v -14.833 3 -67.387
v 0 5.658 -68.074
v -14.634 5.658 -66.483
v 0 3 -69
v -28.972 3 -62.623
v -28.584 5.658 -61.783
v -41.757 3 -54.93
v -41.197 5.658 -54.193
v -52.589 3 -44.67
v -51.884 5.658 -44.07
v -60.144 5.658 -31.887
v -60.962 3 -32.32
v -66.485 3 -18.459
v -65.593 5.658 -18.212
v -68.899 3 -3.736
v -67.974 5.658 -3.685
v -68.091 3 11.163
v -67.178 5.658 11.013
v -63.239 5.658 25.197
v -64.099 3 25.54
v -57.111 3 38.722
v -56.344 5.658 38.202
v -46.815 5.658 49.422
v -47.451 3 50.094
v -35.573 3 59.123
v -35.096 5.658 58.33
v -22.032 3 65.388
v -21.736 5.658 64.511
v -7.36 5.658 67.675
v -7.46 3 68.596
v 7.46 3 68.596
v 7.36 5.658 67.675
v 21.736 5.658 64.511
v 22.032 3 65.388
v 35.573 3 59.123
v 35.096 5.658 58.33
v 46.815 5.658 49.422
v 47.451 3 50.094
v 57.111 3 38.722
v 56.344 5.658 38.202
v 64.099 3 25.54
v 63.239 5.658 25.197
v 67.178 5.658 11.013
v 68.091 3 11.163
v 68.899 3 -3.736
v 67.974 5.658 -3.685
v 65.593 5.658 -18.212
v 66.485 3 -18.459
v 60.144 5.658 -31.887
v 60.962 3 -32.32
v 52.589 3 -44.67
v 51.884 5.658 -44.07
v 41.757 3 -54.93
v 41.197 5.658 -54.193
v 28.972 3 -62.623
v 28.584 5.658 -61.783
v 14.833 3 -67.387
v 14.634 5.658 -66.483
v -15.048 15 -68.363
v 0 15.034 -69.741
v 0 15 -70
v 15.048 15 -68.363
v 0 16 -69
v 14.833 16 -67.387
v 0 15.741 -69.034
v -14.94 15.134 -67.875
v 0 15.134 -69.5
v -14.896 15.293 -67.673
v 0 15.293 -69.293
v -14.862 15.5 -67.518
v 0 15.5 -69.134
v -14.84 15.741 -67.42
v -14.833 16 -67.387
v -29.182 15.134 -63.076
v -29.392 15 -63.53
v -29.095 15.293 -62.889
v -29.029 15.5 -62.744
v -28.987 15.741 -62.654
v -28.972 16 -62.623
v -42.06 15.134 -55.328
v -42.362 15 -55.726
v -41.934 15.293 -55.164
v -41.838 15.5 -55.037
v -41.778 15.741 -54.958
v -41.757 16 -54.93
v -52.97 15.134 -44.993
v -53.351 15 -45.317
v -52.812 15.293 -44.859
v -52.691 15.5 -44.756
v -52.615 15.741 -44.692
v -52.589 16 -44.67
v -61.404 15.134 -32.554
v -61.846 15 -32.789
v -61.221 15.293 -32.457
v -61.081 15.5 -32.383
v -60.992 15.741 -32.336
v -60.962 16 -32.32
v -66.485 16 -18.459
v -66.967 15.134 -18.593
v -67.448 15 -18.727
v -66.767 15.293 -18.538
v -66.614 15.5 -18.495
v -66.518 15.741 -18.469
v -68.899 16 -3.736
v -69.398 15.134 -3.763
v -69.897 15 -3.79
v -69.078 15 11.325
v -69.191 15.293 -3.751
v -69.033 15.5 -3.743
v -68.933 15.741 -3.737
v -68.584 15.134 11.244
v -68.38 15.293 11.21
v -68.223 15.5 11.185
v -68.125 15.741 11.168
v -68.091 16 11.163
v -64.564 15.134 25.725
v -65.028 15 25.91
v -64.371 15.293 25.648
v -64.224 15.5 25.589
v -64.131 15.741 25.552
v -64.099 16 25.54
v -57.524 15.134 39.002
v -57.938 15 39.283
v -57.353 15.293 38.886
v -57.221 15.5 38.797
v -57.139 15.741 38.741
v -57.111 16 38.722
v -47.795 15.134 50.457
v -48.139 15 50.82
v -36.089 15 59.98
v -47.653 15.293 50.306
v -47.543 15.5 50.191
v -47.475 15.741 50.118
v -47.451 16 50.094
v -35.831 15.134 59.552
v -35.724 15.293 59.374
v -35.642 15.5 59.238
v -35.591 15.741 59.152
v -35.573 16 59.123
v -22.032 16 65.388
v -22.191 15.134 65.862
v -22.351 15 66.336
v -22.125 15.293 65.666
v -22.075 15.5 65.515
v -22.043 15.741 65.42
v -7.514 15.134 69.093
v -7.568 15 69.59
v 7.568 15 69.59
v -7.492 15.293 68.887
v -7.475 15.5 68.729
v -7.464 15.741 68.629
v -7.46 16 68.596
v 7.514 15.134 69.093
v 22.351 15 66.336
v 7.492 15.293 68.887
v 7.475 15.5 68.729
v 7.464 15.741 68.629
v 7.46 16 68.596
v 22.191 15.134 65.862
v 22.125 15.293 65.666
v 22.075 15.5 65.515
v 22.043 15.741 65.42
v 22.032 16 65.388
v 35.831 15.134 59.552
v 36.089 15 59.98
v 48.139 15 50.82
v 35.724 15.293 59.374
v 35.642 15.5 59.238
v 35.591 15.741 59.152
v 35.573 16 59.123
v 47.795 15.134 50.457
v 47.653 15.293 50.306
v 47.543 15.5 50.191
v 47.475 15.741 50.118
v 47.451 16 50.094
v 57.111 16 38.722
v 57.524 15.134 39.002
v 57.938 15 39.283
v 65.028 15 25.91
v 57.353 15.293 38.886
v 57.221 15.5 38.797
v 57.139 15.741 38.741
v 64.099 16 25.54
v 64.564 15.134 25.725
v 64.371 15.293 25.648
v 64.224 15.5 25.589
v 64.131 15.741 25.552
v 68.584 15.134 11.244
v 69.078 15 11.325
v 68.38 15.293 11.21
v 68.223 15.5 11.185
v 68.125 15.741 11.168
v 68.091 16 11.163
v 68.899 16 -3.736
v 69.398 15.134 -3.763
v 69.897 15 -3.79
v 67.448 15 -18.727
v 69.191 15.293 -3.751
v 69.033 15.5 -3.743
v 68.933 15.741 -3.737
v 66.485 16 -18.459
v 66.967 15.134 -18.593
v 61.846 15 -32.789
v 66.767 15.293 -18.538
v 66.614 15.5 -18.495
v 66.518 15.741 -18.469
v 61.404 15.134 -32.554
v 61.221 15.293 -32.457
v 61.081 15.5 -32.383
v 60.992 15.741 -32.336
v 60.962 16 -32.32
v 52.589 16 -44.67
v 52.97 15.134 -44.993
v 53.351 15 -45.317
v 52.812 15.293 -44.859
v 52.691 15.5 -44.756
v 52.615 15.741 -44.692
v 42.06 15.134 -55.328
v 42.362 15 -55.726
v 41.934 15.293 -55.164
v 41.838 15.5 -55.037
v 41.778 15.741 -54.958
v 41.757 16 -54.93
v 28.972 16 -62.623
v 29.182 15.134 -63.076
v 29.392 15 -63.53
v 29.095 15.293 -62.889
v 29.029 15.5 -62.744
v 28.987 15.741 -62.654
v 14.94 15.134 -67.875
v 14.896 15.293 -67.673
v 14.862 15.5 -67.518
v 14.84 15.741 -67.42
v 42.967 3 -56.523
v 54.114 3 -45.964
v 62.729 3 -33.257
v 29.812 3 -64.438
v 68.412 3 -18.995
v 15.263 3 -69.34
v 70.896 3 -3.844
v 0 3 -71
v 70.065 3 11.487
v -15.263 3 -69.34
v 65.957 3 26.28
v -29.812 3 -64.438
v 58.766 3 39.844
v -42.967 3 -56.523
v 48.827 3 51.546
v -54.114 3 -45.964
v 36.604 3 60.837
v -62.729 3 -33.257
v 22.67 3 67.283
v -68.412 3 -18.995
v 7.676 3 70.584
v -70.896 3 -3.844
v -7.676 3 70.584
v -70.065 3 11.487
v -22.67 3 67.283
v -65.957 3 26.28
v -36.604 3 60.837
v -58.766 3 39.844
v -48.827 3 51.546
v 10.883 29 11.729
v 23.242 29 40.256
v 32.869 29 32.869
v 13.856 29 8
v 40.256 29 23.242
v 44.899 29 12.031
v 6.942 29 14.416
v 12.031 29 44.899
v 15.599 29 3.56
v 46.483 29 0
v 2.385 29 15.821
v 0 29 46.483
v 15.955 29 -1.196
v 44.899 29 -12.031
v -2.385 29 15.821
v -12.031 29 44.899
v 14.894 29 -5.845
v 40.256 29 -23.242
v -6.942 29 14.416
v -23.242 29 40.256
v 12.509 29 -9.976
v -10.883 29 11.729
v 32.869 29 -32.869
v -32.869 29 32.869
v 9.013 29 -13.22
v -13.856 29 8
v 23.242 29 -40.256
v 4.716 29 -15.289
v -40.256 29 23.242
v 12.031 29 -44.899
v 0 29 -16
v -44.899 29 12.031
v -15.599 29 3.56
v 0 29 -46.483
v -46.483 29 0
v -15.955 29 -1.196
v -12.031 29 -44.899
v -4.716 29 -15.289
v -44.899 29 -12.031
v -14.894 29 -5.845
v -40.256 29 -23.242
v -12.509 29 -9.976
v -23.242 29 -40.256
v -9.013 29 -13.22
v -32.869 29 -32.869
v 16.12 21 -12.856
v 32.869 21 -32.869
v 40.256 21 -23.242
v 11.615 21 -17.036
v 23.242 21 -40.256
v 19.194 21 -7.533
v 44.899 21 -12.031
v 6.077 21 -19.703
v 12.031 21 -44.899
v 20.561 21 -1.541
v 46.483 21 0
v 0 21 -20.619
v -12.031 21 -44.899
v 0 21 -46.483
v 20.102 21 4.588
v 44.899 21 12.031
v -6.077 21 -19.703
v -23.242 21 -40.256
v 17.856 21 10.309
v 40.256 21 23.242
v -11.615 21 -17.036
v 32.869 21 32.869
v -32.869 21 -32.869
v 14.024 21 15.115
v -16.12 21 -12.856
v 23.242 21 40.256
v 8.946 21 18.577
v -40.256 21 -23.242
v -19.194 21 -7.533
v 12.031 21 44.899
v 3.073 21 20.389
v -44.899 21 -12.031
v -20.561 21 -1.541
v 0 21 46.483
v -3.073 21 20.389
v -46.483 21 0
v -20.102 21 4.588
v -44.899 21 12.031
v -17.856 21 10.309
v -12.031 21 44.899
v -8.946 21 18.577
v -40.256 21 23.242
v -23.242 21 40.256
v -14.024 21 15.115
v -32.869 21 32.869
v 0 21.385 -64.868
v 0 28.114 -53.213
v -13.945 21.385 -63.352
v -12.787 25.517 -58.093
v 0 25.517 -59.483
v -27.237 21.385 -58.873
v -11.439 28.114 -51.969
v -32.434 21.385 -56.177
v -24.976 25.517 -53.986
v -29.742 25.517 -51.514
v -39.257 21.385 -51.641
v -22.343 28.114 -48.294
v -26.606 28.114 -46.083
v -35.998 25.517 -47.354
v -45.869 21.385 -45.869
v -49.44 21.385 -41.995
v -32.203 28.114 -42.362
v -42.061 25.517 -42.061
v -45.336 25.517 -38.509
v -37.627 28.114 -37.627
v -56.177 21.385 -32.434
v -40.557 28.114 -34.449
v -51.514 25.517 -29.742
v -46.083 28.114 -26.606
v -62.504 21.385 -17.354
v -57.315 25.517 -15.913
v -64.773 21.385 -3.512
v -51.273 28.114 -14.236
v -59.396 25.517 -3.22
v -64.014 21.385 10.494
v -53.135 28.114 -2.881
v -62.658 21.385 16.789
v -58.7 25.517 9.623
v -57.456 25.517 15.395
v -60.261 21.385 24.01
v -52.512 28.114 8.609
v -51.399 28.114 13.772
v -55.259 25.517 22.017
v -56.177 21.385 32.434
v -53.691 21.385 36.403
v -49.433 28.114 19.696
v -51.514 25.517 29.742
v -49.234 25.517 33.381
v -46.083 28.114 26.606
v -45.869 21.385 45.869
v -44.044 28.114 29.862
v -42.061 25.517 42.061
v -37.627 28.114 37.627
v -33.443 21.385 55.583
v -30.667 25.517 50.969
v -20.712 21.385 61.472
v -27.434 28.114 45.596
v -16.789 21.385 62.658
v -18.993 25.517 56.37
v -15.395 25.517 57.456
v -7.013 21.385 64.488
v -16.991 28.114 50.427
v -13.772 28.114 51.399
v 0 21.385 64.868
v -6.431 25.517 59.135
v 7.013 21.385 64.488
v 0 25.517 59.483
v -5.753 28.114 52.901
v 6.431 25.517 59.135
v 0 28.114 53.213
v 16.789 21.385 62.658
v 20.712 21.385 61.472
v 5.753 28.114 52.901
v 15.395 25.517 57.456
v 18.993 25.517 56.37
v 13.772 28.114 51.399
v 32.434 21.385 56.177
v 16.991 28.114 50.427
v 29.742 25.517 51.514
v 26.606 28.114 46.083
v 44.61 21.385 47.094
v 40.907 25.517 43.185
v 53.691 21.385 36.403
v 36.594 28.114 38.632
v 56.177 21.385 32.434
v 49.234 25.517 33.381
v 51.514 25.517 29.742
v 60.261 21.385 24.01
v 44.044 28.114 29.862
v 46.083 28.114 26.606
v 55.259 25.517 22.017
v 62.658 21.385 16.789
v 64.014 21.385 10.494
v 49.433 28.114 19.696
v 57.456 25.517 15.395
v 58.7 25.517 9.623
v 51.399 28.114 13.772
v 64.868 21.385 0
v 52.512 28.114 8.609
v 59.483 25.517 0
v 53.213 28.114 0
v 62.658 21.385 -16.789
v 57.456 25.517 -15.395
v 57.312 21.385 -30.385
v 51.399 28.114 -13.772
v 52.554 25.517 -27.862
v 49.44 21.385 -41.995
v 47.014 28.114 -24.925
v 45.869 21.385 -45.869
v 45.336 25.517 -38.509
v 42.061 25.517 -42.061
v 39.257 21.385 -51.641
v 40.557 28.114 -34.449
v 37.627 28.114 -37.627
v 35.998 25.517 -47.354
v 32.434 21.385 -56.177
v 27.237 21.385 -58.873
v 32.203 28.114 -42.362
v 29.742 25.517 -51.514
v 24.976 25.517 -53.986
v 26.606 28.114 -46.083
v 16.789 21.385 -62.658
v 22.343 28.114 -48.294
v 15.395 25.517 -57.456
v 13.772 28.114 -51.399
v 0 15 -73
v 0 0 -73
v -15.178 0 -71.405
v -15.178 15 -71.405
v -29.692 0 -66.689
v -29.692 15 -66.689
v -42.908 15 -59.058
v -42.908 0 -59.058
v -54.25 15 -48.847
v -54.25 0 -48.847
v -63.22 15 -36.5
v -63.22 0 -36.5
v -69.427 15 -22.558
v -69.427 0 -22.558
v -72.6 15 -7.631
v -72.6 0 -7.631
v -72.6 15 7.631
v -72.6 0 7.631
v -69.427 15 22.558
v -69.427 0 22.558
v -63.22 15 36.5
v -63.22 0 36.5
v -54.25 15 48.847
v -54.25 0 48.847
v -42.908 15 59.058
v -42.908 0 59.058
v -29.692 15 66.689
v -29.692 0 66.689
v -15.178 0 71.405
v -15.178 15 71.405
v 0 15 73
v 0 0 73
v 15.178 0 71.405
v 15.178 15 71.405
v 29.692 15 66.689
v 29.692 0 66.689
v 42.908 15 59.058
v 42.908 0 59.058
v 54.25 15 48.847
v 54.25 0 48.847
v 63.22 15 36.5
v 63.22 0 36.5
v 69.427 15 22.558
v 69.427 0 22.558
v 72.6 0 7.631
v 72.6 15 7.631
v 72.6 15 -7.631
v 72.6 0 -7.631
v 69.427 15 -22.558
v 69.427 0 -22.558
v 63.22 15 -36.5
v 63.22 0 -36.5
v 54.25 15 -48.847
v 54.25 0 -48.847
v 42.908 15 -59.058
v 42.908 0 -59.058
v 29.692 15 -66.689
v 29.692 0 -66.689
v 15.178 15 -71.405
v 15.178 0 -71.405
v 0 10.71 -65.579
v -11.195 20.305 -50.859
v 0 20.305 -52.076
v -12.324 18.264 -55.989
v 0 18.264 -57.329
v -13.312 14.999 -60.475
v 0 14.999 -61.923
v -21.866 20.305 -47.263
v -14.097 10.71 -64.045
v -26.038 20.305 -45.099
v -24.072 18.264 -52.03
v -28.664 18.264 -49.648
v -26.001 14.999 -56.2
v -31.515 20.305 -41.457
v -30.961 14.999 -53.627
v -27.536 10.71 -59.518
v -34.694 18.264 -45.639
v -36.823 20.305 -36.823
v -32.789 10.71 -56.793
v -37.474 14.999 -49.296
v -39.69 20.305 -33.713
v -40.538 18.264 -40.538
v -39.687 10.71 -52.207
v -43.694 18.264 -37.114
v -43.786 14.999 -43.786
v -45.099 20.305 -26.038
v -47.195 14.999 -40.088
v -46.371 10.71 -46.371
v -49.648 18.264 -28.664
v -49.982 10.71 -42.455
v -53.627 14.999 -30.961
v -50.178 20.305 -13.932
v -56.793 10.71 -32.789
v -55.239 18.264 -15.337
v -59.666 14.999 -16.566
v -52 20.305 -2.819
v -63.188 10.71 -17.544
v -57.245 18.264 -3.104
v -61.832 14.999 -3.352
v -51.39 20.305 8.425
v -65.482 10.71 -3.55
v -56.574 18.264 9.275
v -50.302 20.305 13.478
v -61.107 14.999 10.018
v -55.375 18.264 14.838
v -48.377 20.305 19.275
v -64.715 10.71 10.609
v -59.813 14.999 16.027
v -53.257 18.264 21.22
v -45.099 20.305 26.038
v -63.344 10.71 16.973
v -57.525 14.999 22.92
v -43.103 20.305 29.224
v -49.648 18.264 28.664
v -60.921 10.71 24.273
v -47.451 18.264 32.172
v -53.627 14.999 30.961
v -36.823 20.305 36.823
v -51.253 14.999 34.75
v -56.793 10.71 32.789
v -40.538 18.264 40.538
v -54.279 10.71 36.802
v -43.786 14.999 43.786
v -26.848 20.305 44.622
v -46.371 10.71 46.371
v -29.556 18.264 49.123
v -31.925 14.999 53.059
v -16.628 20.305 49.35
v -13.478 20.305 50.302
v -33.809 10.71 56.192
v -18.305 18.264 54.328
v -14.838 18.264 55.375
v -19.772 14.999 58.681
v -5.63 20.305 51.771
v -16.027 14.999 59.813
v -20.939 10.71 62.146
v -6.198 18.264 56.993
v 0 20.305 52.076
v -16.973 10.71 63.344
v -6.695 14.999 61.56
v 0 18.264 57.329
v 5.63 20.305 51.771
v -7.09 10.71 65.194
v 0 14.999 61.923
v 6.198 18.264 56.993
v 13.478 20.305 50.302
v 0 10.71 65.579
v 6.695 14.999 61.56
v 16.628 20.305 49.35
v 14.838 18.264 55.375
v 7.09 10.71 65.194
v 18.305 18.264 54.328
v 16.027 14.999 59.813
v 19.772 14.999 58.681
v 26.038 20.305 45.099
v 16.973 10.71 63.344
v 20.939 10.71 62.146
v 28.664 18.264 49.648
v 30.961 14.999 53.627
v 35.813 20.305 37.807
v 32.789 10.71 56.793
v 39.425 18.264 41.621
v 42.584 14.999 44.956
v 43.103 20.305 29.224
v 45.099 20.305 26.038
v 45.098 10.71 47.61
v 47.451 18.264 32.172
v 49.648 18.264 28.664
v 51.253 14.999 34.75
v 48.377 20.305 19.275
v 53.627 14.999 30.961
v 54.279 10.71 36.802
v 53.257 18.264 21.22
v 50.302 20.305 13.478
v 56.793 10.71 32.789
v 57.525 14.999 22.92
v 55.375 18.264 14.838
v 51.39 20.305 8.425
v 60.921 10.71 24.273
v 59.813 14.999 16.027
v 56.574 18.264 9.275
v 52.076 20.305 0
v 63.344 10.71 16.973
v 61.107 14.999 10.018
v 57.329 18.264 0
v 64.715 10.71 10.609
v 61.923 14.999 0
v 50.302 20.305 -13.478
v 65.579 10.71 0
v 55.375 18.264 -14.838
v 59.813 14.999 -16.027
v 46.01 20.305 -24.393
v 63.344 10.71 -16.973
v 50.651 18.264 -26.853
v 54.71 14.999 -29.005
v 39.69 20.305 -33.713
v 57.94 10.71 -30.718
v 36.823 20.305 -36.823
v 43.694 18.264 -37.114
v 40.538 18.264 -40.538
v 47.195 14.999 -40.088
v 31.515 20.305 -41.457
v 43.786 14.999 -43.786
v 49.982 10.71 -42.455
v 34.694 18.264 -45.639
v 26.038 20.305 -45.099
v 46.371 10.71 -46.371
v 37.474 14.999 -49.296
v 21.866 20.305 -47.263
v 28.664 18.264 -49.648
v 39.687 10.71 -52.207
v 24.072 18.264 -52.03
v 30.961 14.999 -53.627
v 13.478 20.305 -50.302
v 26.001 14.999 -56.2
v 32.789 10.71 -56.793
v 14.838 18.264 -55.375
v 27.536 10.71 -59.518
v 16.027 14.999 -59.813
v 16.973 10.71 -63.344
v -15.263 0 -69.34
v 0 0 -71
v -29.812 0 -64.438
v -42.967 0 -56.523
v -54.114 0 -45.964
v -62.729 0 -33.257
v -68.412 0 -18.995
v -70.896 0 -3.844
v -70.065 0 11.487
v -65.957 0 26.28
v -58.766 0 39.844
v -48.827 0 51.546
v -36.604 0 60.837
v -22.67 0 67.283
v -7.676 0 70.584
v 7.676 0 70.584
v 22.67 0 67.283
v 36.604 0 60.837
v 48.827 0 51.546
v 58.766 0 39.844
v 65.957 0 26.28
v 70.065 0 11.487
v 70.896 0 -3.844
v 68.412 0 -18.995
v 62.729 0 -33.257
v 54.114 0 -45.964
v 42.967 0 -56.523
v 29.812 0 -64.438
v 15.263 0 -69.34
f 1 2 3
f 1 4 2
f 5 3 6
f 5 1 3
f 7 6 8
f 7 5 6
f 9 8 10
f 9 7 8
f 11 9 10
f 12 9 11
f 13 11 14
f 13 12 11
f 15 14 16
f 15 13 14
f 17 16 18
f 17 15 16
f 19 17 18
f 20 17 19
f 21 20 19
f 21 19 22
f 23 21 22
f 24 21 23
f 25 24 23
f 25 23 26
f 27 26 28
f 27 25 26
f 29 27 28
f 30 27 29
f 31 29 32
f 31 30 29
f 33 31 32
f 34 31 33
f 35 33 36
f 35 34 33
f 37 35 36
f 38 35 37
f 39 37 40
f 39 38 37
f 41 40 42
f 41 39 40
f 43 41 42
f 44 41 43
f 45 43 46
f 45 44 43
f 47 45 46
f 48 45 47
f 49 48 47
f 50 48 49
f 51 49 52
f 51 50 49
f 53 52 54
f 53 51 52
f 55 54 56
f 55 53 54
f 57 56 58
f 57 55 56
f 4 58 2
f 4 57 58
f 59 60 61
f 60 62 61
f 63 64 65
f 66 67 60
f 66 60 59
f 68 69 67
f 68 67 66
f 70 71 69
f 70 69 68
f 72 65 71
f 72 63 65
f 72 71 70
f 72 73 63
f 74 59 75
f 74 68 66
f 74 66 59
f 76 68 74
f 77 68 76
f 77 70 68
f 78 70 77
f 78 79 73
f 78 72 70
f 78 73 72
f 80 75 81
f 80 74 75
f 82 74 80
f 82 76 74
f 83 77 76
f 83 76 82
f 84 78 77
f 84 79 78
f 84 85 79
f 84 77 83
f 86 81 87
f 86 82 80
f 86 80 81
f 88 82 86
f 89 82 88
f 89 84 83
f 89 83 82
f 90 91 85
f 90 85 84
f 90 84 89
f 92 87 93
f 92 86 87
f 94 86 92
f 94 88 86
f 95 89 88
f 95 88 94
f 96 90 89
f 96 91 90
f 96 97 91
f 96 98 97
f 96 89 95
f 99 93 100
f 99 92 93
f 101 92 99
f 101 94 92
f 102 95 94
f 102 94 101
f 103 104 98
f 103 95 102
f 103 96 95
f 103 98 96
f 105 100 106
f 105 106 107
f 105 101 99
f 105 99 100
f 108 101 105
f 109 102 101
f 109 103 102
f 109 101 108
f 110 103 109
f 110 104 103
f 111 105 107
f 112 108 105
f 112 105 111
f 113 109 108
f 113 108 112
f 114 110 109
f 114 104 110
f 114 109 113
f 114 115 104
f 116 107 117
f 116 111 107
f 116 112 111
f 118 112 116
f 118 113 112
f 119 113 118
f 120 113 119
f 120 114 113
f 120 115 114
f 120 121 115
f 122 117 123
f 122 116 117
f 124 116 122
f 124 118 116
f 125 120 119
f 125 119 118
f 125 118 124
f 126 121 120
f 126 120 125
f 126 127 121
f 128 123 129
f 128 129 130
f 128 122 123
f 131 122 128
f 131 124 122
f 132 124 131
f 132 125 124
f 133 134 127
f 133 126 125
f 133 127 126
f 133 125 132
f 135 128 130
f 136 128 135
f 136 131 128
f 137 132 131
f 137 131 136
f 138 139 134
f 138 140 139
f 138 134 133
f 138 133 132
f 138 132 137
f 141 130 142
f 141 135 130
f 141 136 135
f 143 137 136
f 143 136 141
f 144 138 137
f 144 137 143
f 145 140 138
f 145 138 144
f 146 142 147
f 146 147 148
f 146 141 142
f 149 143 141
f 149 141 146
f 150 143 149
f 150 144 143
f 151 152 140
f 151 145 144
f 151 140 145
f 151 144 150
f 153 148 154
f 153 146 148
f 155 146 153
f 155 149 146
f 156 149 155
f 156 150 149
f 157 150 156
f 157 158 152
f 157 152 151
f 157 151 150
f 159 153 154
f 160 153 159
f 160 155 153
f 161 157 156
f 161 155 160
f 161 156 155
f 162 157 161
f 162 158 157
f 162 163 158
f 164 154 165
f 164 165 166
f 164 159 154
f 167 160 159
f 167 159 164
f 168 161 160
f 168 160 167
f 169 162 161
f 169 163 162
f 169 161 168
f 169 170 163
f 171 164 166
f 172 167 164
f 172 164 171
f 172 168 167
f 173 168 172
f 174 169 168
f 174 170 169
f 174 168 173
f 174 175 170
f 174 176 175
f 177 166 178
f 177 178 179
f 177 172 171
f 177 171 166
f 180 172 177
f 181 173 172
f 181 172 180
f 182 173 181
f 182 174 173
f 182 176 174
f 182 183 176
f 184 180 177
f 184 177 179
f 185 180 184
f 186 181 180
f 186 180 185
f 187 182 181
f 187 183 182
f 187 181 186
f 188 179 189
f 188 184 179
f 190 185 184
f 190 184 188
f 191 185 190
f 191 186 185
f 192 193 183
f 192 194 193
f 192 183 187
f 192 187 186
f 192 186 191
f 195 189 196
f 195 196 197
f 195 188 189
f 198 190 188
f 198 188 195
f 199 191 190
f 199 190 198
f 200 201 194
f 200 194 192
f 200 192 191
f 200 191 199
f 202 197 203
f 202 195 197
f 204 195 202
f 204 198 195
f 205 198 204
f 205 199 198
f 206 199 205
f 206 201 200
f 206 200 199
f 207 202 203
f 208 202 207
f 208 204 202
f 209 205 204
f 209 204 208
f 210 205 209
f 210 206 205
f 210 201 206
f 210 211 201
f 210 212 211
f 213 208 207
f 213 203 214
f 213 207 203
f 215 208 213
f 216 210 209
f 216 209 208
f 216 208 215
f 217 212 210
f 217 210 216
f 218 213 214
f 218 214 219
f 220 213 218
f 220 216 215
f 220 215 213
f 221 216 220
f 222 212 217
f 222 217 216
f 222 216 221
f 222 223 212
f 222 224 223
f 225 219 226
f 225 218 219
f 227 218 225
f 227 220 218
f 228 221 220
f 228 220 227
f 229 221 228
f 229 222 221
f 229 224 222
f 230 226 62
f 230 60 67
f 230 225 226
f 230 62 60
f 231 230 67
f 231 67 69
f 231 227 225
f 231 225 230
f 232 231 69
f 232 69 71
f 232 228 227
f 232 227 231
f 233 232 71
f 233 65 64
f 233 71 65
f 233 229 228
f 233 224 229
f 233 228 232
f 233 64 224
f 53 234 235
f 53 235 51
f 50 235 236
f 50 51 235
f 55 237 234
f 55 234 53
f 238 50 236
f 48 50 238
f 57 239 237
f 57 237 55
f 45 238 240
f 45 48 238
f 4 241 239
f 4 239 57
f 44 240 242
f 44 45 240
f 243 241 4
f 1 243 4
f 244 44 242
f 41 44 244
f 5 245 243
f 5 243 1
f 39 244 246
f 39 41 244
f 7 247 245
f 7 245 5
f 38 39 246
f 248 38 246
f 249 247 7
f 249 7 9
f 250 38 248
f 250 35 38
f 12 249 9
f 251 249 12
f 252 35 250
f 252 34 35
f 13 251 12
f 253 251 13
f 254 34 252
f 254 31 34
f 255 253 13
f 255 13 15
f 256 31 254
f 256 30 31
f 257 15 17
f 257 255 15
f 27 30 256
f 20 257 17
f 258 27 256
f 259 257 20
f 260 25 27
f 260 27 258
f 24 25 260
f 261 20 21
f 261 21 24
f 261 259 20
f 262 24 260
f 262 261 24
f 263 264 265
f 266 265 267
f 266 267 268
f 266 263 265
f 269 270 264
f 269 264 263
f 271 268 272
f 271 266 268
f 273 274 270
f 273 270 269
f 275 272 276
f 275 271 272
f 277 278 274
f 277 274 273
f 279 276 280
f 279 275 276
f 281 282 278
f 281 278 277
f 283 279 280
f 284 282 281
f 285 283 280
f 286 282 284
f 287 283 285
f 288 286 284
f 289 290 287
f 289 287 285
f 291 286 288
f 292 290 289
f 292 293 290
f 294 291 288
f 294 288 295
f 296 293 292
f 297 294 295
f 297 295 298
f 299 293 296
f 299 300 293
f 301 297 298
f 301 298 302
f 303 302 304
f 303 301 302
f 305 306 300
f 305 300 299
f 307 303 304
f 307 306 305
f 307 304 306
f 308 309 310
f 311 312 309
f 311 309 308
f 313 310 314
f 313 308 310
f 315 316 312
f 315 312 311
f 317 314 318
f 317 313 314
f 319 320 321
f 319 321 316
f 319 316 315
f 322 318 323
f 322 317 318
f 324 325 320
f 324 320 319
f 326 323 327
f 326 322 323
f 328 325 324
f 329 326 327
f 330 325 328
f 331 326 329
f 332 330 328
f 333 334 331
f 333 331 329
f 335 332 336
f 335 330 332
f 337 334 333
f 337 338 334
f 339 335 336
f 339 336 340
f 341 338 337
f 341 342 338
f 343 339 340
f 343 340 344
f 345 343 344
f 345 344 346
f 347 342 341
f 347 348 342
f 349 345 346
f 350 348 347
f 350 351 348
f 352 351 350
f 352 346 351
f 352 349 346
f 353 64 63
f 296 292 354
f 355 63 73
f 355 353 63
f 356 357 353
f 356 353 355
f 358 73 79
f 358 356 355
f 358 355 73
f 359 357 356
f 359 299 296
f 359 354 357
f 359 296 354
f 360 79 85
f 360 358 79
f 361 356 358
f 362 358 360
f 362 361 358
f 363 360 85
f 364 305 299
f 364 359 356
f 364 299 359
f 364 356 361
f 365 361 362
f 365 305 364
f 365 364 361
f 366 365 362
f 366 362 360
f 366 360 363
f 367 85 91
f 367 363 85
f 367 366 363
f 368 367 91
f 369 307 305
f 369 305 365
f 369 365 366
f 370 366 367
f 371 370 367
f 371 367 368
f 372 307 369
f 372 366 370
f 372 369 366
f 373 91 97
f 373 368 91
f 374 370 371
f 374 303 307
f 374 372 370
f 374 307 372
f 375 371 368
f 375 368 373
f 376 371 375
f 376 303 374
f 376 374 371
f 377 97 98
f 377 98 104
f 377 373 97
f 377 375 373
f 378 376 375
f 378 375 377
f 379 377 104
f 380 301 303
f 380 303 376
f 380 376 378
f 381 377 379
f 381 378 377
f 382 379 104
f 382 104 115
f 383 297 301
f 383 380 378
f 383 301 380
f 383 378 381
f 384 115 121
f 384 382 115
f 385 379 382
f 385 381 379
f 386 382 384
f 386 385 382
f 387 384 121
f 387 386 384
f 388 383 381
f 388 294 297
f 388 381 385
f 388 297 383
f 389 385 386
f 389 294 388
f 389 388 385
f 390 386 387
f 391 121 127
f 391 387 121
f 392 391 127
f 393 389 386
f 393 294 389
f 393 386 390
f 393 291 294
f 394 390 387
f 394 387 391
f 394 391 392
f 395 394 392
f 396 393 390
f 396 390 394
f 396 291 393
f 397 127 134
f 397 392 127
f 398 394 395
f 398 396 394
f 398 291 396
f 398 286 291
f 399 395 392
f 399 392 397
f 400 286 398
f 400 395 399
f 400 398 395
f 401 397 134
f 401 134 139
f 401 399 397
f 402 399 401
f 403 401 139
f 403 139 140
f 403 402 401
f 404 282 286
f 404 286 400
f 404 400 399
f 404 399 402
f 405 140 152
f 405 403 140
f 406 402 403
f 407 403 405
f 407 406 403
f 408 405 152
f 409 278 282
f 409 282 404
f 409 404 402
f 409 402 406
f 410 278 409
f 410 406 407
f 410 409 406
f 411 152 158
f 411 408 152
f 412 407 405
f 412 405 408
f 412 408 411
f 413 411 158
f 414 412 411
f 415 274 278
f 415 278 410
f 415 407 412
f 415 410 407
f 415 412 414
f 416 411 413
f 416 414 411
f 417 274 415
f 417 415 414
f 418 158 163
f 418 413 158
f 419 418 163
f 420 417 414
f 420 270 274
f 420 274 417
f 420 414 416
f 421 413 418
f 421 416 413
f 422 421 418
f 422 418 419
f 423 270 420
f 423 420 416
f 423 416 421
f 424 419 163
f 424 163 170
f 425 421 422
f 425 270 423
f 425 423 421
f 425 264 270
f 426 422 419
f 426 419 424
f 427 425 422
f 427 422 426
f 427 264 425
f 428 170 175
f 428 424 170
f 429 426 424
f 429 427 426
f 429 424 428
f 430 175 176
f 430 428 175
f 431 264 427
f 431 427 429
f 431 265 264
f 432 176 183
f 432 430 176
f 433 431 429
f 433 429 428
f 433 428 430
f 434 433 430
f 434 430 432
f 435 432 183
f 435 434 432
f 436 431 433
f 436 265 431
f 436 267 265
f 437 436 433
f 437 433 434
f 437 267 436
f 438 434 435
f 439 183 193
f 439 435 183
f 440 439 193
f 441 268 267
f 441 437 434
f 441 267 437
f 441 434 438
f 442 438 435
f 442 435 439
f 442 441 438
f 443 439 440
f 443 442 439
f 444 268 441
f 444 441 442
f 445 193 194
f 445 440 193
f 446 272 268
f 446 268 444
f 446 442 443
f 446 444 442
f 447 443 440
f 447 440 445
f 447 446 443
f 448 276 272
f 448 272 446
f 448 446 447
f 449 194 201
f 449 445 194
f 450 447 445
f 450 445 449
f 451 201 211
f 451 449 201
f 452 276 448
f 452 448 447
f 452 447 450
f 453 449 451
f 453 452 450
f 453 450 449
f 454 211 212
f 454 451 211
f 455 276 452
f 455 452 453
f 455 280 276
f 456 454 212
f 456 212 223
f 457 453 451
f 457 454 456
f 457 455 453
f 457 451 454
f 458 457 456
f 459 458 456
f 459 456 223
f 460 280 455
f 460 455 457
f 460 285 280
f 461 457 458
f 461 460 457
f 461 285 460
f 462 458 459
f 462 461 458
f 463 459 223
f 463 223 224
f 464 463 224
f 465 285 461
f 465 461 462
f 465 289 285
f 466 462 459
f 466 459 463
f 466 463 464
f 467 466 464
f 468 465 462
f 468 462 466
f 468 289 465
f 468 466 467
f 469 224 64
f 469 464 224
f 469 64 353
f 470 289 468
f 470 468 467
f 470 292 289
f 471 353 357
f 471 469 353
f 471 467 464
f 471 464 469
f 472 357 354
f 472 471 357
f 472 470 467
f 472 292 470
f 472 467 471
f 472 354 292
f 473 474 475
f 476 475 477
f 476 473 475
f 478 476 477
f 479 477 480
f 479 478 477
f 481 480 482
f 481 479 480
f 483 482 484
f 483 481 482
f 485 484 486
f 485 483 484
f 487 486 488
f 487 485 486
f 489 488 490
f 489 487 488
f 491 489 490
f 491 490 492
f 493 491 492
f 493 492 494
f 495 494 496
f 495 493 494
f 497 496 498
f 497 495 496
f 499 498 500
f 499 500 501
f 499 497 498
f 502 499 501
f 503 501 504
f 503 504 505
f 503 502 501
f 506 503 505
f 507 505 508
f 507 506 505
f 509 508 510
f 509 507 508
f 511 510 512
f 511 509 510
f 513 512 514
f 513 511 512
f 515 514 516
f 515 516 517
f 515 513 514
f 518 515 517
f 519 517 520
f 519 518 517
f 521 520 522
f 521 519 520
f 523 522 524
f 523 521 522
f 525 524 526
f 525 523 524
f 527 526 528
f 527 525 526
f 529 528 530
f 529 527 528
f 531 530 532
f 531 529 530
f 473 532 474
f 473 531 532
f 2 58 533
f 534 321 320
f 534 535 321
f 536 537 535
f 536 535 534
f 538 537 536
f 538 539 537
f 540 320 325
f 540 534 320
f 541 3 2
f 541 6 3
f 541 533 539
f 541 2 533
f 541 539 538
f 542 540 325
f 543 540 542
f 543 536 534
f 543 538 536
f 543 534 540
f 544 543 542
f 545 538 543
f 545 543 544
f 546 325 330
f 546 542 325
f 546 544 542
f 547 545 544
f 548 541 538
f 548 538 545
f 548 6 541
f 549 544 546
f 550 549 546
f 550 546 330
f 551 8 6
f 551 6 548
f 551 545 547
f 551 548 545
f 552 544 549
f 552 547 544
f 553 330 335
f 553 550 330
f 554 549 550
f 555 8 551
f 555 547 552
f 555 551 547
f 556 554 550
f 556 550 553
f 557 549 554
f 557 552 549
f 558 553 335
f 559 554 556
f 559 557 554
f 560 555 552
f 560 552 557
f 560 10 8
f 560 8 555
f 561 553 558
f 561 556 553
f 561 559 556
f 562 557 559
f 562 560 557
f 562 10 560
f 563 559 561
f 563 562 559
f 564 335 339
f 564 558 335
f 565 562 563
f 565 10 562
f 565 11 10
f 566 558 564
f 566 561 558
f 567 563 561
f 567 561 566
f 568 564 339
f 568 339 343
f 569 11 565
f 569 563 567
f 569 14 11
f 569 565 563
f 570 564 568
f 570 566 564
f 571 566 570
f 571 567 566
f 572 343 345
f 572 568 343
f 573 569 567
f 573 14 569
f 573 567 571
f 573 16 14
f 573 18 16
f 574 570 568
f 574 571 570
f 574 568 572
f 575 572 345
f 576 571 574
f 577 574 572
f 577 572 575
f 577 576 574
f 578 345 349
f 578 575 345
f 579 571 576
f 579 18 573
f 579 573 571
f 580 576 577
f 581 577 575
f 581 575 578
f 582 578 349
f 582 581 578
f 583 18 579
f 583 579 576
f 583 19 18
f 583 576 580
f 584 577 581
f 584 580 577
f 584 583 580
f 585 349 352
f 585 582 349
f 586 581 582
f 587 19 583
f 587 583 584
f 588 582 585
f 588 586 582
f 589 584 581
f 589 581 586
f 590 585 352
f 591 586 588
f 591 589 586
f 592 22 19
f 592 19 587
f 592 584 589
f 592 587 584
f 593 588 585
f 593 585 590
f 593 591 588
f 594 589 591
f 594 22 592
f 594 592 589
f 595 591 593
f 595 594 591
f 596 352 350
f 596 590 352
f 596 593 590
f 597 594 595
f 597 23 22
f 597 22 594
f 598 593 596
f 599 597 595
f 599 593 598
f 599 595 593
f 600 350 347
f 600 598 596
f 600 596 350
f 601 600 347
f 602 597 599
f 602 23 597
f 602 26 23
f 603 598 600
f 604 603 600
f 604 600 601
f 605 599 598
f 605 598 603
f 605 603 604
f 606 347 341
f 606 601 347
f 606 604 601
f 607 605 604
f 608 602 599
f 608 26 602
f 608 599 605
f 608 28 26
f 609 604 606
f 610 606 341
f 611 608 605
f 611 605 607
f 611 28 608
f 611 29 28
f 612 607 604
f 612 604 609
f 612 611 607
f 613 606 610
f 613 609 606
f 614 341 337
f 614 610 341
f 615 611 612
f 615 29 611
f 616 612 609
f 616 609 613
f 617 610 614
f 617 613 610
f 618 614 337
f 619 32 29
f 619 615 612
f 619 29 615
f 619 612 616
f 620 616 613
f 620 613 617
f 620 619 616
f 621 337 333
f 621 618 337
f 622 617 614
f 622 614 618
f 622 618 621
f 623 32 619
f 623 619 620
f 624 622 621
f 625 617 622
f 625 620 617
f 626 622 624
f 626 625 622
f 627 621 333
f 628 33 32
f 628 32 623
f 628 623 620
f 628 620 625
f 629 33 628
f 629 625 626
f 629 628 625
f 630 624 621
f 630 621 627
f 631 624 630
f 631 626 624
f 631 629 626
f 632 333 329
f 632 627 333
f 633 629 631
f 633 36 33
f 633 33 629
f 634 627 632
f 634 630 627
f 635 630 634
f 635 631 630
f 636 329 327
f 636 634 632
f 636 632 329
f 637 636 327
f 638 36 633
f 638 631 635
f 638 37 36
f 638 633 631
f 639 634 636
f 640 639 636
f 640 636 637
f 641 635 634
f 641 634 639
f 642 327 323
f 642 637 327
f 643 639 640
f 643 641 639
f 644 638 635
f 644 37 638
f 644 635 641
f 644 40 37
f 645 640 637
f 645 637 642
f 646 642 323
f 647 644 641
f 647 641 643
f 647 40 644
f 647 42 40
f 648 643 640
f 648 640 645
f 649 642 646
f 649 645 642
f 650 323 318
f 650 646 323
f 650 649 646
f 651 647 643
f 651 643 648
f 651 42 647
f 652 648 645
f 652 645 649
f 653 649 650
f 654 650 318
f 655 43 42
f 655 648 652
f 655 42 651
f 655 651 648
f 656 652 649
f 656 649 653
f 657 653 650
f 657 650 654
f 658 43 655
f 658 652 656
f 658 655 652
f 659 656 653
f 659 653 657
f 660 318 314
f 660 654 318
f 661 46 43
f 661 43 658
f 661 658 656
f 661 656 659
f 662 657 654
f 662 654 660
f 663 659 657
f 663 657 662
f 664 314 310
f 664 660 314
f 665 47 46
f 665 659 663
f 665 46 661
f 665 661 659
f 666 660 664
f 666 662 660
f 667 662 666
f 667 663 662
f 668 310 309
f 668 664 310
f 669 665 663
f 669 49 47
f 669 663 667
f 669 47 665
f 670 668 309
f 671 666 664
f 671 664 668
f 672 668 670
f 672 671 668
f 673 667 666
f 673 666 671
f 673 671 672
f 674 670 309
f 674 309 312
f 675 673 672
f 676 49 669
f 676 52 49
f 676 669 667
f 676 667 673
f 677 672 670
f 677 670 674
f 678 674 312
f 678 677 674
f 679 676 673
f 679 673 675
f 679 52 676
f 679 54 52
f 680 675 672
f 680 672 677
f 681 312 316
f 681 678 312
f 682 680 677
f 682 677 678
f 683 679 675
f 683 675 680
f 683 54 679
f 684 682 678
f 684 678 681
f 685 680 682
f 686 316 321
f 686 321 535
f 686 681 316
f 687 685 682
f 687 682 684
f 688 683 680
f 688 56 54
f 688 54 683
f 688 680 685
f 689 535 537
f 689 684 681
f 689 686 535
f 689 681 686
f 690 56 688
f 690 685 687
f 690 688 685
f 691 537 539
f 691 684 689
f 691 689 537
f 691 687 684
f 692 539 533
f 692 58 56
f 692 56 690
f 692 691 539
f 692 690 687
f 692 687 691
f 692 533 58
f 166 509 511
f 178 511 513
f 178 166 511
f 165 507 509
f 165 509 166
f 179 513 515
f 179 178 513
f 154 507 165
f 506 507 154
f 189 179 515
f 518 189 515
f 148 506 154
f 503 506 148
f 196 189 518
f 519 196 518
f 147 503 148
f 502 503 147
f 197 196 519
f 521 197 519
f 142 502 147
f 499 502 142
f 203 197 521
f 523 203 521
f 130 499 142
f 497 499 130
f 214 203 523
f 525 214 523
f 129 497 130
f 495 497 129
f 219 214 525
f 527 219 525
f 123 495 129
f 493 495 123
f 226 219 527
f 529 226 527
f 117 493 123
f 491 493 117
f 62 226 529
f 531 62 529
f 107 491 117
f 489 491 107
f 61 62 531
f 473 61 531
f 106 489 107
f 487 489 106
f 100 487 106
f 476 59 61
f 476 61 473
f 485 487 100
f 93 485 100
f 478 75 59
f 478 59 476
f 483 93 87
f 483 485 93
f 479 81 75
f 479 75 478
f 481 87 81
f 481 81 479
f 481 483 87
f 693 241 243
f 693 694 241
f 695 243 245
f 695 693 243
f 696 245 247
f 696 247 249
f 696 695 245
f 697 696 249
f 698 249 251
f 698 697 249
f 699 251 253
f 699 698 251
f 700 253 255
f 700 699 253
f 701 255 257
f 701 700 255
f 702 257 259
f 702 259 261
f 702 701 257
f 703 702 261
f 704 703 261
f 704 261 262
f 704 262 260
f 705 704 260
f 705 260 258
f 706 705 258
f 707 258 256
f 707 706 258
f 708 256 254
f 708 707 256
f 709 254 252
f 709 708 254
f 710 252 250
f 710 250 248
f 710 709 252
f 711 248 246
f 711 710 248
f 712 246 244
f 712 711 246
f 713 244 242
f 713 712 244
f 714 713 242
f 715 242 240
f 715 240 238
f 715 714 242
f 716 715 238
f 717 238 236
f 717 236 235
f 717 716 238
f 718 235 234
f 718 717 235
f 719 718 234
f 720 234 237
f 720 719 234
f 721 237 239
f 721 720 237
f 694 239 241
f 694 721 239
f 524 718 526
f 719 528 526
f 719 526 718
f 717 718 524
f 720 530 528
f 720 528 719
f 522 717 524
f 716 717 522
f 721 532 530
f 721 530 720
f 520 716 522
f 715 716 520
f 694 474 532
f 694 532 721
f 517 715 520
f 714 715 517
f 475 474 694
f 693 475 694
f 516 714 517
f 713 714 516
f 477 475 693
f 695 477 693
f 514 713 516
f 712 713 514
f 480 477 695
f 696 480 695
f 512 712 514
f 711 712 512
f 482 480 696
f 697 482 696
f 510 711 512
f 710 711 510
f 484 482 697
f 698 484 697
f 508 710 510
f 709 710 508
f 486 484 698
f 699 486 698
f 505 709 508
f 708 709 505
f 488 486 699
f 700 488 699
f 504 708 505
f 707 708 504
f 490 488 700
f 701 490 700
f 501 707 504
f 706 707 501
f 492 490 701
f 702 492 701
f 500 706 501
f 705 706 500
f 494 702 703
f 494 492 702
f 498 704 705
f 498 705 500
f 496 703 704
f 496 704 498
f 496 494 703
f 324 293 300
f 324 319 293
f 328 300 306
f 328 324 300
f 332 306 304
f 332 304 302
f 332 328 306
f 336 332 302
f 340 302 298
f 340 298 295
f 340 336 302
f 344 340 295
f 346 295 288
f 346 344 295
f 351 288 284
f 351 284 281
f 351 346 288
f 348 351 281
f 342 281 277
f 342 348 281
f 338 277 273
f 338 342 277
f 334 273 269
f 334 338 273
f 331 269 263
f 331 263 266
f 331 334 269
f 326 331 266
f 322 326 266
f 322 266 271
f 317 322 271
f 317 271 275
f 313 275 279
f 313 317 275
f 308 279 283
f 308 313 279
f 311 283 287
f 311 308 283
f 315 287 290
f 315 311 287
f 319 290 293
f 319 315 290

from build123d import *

# Parameters (mm, degrees)
RACCORDO1_R = 1


with BuildPart() as part:
    # Schizzo1 → Rivoluzione1 (revolve)
    with BuildSketch(Plane.XY, mode=Mode.PRIVATE) as rivoluzione1_sk:
        with BuildLine():
            Line((-71, 0), (-73, 0))
            Line((-73, 0), (-73, 15))
            Line((-73, 15), (-69, 15))
            Line((-69, 15), (-69, 16))
            ThreePointArc((-69, 16), (-59.483339502, 25.516660498), (-46.483339502, 29))
            Line((-46.483339502, 29), (-16, 29))
            Line((-16, 29), (-20.618802154, 21))
            Line((-20.618802154, 21), (-46.483339502, 21))
            ThreePointArc((-46.483339502, 21), (-59.726832166, 16.773781497), (-68.074288586, 5.657532485))
            Line((-68.074288586, 5.657532485), (-69, 3))
            Line((-69, 3), (-71, 3))
            Line((-71, 3), (-71, 0))
        make_face()
    revolve(rivoluzione1_sk.sketch.rotate(Axis((0, 0, 0), (0, 1, 0)), 270), axis=Axis((0, 0, 0), (0, 1, 0)))

    # Raccordo1
    raccordo1_edges = [part.edges().sort_by_distance(p)[0] for p in [
        (0, 15, 69),
    ]]
    fillet(raccordo1_edges, radius=RACCORDO1_R - 0.0001)  # a hair under: the kernel refuses the full size


solid = part.part
